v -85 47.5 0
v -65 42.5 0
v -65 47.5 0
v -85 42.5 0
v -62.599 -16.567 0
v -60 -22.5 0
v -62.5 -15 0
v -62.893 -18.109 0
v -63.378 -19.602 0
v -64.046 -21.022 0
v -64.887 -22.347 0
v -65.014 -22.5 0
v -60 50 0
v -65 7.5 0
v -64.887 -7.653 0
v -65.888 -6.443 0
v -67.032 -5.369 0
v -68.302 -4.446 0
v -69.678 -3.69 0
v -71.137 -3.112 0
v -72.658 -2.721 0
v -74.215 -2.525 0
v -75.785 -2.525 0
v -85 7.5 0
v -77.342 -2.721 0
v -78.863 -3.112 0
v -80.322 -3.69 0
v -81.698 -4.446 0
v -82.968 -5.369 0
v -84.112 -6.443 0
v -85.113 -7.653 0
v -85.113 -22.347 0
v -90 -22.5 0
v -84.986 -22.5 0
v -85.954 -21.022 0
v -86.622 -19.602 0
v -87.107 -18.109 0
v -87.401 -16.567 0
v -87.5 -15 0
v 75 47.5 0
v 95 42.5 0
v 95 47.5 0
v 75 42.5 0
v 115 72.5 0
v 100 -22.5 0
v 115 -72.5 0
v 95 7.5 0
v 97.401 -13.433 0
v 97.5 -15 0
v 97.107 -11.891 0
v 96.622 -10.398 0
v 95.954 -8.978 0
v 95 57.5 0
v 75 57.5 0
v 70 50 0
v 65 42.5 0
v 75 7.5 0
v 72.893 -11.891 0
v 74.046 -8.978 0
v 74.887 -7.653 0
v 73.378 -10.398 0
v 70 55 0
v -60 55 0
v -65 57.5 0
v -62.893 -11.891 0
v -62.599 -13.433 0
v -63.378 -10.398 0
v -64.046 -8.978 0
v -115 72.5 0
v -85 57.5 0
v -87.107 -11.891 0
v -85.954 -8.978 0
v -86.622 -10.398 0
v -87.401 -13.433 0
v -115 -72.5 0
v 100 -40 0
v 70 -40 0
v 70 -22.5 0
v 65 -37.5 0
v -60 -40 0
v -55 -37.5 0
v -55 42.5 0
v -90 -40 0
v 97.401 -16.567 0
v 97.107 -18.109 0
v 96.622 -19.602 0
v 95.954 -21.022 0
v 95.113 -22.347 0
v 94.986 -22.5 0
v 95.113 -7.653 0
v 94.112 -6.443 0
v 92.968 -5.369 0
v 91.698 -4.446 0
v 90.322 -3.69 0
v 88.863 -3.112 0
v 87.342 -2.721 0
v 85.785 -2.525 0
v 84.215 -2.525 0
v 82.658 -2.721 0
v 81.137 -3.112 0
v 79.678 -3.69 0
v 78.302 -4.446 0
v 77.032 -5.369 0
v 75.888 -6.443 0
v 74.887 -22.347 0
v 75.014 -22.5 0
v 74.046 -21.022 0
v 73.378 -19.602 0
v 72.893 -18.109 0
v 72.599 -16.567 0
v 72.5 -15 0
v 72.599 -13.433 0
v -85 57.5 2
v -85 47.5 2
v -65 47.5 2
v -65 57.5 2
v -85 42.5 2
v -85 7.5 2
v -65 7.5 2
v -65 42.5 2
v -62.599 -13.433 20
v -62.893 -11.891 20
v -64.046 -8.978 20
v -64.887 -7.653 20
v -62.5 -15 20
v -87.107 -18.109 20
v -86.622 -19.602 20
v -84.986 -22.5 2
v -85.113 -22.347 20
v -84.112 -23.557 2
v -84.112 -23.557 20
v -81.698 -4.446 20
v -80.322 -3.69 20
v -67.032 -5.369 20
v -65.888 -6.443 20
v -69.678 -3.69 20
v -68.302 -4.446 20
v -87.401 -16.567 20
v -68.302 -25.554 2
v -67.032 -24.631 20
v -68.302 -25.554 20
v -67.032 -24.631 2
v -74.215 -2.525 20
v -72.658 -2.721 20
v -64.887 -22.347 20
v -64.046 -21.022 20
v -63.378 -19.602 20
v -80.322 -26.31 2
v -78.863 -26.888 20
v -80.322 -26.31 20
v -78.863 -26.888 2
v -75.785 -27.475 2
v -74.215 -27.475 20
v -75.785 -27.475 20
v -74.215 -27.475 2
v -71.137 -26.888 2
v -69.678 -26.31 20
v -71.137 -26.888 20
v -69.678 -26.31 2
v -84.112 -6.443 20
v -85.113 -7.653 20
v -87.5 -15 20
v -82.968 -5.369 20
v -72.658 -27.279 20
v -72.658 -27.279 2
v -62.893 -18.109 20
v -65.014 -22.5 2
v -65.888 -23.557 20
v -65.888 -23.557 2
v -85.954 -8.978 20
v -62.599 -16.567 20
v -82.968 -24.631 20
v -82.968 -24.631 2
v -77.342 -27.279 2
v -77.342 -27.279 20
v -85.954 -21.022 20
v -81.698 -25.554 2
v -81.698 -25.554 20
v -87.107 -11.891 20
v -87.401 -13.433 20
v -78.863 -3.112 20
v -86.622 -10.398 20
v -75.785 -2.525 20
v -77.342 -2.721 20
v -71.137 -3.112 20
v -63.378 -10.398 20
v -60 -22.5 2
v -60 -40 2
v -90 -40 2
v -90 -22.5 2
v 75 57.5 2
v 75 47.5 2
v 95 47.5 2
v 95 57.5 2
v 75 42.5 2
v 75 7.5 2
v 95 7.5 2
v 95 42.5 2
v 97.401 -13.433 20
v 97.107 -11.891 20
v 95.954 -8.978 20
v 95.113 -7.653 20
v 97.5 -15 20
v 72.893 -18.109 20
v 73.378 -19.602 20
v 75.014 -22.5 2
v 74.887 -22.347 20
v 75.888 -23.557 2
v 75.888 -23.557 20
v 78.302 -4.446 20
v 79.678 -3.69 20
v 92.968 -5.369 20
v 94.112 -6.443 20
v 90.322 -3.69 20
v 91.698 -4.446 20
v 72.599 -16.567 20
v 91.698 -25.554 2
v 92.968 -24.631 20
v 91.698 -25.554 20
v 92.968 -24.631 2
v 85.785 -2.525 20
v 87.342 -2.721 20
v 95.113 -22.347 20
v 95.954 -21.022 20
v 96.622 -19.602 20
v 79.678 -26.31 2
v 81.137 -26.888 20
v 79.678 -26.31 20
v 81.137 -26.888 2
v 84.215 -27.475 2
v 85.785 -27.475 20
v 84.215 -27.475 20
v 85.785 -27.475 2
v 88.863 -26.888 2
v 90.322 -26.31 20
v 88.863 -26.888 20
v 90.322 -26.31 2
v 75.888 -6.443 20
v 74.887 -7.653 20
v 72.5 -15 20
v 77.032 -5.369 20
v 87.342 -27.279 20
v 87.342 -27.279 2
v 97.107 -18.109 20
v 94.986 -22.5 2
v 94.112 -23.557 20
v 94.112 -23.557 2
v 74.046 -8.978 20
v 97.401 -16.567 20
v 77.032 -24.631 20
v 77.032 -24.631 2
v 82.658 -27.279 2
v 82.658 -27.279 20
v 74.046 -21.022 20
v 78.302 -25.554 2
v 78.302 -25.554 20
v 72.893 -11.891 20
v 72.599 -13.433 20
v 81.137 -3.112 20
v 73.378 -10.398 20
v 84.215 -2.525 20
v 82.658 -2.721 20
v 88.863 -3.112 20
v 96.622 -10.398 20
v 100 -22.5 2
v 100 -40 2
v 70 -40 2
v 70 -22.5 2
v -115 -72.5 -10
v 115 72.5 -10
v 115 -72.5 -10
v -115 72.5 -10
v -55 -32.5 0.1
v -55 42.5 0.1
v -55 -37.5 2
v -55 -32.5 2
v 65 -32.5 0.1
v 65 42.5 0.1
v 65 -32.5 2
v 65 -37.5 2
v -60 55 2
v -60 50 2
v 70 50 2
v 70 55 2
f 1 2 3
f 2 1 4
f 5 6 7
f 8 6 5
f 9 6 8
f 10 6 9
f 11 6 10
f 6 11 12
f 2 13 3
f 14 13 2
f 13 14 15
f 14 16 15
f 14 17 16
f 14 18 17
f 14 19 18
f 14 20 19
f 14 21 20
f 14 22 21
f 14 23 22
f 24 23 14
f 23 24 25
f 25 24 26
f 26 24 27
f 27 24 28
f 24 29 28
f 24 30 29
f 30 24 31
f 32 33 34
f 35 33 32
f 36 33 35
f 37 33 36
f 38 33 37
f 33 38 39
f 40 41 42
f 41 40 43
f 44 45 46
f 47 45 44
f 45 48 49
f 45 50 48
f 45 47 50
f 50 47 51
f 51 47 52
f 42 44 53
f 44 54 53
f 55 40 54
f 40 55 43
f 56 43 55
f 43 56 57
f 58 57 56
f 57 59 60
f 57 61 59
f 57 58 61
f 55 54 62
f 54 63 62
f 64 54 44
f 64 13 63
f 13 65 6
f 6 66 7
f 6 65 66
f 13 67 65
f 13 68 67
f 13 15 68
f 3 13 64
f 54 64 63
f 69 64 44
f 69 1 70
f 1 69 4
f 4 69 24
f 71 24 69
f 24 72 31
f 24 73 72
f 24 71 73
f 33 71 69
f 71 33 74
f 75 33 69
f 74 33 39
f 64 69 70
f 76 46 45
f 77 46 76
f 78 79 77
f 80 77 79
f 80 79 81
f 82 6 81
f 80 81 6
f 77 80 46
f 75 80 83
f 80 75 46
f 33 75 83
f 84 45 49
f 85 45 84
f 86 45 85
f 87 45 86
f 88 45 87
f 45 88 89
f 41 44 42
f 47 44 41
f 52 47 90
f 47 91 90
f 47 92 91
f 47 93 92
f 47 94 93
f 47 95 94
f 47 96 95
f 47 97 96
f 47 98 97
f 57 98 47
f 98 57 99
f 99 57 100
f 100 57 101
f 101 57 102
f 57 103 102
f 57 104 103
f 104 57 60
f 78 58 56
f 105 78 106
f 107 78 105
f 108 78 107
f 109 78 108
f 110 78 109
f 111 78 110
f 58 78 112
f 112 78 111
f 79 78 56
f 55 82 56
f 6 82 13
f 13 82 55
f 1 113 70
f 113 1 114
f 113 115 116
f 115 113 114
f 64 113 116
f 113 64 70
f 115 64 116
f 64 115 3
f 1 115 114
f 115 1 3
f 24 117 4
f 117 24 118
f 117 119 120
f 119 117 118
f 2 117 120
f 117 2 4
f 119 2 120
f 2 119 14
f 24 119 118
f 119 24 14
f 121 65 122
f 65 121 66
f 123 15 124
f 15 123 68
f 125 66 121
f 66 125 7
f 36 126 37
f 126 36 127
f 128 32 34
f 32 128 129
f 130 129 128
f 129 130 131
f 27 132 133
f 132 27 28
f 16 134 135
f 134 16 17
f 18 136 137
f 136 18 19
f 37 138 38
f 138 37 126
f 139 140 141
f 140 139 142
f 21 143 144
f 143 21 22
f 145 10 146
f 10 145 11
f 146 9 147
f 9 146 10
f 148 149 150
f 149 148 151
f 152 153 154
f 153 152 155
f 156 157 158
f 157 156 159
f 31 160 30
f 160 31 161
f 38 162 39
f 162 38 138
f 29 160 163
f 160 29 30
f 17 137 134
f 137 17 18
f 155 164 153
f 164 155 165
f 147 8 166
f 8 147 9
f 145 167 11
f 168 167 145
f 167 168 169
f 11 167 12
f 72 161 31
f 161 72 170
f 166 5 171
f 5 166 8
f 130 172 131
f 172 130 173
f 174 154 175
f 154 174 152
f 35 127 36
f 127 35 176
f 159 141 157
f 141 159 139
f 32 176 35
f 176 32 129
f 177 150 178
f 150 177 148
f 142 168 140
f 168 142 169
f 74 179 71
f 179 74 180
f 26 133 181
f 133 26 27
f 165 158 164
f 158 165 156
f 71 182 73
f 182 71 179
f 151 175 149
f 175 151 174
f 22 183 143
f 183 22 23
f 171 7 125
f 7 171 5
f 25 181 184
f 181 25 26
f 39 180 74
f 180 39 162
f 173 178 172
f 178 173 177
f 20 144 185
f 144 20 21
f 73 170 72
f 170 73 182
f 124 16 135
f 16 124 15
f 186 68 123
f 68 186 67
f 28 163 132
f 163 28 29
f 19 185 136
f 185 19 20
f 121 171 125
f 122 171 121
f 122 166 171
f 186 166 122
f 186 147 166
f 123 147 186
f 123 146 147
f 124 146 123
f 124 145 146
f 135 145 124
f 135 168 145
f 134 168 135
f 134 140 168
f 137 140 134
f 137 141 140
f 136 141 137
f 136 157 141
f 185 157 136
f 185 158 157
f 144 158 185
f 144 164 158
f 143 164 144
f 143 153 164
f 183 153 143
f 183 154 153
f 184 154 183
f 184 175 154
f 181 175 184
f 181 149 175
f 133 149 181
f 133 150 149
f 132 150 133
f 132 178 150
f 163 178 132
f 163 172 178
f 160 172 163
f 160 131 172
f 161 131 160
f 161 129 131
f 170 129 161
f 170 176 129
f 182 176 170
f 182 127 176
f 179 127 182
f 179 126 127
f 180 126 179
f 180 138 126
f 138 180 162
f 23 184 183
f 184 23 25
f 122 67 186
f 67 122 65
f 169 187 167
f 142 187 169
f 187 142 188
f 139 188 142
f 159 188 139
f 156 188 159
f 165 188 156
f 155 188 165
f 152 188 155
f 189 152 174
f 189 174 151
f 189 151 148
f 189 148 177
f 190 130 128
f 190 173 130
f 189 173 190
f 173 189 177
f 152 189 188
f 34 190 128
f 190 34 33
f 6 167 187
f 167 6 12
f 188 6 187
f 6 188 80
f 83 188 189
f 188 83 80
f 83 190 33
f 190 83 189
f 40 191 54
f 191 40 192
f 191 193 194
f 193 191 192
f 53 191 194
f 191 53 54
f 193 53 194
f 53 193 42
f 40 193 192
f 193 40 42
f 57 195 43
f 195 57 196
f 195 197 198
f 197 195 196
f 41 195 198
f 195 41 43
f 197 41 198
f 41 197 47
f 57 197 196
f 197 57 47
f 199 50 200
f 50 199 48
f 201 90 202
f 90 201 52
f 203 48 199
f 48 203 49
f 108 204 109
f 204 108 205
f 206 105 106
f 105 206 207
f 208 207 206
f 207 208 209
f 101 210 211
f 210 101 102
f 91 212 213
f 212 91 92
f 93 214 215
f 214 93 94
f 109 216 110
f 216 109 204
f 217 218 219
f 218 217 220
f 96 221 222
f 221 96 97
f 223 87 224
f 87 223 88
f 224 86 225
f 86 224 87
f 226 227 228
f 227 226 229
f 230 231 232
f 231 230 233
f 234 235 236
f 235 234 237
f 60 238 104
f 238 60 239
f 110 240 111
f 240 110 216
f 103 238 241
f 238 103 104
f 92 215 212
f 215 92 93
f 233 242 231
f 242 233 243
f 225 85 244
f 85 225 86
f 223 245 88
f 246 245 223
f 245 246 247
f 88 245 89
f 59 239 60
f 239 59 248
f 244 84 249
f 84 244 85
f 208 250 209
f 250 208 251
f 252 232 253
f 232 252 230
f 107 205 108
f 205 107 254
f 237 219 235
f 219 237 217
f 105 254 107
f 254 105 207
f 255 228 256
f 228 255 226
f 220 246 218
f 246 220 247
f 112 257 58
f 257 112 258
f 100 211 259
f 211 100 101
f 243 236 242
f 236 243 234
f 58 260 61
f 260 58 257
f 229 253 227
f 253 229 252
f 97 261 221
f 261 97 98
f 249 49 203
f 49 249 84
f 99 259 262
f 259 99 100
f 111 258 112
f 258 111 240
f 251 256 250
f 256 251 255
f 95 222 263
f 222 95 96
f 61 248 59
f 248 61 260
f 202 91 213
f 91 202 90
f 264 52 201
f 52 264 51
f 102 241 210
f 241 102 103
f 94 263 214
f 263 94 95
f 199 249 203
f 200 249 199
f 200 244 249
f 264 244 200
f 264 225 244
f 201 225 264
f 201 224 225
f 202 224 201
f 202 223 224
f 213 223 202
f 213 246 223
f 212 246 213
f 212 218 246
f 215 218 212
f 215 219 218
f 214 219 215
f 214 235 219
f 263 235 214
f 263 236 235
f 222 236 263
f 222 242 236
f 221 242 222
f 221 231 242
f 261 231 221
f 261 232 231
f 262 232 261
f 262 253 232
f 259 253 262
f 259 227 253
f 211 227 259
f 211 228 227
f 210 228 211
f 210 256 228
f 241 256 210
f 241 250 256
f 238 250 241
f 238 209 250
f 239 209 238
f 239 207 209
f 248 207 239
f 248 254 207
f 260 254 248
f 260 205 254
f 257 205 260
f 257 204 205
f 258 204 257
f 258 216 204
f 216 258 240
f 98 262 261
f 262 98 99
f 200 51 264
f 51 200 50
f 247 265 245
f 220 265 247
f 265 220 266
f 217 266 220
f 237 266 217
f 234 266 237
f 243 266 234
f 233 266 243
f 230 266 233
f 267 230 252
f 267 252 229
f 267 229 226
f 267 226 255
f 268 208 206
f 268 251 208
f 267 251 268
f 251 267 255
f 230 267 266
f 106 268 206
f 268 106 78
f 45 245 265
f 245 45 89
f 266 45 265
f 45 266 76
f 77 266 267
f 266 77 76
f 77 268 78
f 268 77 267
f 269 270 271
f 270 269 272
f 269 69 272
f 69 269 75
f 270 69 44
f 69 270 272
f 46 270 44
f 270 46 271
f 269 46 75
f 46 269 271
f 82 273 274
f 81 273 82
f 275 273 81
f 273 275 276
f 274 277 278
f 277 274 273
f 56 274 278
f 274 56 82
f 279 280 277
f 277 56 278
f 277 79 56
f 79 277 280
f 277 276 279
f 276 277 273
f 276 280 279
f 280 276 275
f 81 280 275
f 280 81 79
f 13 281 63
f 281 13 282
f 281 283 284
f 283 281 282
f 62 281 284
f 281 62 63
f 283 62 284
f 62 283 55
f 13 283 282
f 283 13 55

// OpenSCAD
module dash(){
    module dash_cm(){
        total_area_dims = [23, 14.5];
        
        // total dash
        color("LightBlue")translate([0,0,-1])linear_extrude(height=1)square(total_area_dims, center=true);
        
        // screen
        screen_dims = [12, 7.5];
        screen_center = [0.5, 0.5, 0];
        color("Blue")translate(screen_center)linear_extrude(height=.01)square(screen_dims, center=true);
        
        // buttons
        button_height = 0.2;
        
        radio_button_dims = [screen_dims[0], 0.5];
        radio_button_center = screen_center + [0, -((screen_dims[1]/2)+radio_button_dims[1]/2)];
        color("DodgerBlue")translate(radio_button_center)linear_extrude(height=button_height)square(radio_button_dims, center=true);
        
        // cd player
        cd_player_dims = [13, 0.5];
        cd_player_center = screen_center + [0, screen_dims[1]/2 + 1];
        color("DodgerBlue")translate(cd_player_center)linear_extrude(height=button_height)square(cd_player_dims, center=true);
        
        module side_buttons() {
            color("DeepSkyBlue")translate([0,1,0])linear_extrude(height=button_height)square([2,1], center=true);
            color("DeepSkyBlue")translate([0,-1.75/2,0])linear_extrude(height=button_height)square([2,1.75], center=true);
            color("blue")translate([0,-1.75 * 3/2,0])linear_extrude(height=button_height)square([2,1.75], center=true);
            
            color("CornflowerBlue")translate([0,-5.75,0])linear_extrude(height=2)circle(1.25, $fn=50);
            color("DeepSkyBlue")translate([1.5/2,-5.75 - 2.5 + (1.75/2),0])linear_extrude(height=button_height)square([1.5,1.75], center=true);
            color("blue")translate([-1.5/2,-5.75 - 2.5 + (1.75/2),0])linear_extrude(height=button_height)square([1.5,1.75], center=true);
        }
        for(i=[-1,1]) translate(screen_center + [i*(screen_dims[0]/2+2), screen_dims[1]/2, 0])side_buttons();
    }
    scale([10,10,10])dash_cm();
}
dash();
